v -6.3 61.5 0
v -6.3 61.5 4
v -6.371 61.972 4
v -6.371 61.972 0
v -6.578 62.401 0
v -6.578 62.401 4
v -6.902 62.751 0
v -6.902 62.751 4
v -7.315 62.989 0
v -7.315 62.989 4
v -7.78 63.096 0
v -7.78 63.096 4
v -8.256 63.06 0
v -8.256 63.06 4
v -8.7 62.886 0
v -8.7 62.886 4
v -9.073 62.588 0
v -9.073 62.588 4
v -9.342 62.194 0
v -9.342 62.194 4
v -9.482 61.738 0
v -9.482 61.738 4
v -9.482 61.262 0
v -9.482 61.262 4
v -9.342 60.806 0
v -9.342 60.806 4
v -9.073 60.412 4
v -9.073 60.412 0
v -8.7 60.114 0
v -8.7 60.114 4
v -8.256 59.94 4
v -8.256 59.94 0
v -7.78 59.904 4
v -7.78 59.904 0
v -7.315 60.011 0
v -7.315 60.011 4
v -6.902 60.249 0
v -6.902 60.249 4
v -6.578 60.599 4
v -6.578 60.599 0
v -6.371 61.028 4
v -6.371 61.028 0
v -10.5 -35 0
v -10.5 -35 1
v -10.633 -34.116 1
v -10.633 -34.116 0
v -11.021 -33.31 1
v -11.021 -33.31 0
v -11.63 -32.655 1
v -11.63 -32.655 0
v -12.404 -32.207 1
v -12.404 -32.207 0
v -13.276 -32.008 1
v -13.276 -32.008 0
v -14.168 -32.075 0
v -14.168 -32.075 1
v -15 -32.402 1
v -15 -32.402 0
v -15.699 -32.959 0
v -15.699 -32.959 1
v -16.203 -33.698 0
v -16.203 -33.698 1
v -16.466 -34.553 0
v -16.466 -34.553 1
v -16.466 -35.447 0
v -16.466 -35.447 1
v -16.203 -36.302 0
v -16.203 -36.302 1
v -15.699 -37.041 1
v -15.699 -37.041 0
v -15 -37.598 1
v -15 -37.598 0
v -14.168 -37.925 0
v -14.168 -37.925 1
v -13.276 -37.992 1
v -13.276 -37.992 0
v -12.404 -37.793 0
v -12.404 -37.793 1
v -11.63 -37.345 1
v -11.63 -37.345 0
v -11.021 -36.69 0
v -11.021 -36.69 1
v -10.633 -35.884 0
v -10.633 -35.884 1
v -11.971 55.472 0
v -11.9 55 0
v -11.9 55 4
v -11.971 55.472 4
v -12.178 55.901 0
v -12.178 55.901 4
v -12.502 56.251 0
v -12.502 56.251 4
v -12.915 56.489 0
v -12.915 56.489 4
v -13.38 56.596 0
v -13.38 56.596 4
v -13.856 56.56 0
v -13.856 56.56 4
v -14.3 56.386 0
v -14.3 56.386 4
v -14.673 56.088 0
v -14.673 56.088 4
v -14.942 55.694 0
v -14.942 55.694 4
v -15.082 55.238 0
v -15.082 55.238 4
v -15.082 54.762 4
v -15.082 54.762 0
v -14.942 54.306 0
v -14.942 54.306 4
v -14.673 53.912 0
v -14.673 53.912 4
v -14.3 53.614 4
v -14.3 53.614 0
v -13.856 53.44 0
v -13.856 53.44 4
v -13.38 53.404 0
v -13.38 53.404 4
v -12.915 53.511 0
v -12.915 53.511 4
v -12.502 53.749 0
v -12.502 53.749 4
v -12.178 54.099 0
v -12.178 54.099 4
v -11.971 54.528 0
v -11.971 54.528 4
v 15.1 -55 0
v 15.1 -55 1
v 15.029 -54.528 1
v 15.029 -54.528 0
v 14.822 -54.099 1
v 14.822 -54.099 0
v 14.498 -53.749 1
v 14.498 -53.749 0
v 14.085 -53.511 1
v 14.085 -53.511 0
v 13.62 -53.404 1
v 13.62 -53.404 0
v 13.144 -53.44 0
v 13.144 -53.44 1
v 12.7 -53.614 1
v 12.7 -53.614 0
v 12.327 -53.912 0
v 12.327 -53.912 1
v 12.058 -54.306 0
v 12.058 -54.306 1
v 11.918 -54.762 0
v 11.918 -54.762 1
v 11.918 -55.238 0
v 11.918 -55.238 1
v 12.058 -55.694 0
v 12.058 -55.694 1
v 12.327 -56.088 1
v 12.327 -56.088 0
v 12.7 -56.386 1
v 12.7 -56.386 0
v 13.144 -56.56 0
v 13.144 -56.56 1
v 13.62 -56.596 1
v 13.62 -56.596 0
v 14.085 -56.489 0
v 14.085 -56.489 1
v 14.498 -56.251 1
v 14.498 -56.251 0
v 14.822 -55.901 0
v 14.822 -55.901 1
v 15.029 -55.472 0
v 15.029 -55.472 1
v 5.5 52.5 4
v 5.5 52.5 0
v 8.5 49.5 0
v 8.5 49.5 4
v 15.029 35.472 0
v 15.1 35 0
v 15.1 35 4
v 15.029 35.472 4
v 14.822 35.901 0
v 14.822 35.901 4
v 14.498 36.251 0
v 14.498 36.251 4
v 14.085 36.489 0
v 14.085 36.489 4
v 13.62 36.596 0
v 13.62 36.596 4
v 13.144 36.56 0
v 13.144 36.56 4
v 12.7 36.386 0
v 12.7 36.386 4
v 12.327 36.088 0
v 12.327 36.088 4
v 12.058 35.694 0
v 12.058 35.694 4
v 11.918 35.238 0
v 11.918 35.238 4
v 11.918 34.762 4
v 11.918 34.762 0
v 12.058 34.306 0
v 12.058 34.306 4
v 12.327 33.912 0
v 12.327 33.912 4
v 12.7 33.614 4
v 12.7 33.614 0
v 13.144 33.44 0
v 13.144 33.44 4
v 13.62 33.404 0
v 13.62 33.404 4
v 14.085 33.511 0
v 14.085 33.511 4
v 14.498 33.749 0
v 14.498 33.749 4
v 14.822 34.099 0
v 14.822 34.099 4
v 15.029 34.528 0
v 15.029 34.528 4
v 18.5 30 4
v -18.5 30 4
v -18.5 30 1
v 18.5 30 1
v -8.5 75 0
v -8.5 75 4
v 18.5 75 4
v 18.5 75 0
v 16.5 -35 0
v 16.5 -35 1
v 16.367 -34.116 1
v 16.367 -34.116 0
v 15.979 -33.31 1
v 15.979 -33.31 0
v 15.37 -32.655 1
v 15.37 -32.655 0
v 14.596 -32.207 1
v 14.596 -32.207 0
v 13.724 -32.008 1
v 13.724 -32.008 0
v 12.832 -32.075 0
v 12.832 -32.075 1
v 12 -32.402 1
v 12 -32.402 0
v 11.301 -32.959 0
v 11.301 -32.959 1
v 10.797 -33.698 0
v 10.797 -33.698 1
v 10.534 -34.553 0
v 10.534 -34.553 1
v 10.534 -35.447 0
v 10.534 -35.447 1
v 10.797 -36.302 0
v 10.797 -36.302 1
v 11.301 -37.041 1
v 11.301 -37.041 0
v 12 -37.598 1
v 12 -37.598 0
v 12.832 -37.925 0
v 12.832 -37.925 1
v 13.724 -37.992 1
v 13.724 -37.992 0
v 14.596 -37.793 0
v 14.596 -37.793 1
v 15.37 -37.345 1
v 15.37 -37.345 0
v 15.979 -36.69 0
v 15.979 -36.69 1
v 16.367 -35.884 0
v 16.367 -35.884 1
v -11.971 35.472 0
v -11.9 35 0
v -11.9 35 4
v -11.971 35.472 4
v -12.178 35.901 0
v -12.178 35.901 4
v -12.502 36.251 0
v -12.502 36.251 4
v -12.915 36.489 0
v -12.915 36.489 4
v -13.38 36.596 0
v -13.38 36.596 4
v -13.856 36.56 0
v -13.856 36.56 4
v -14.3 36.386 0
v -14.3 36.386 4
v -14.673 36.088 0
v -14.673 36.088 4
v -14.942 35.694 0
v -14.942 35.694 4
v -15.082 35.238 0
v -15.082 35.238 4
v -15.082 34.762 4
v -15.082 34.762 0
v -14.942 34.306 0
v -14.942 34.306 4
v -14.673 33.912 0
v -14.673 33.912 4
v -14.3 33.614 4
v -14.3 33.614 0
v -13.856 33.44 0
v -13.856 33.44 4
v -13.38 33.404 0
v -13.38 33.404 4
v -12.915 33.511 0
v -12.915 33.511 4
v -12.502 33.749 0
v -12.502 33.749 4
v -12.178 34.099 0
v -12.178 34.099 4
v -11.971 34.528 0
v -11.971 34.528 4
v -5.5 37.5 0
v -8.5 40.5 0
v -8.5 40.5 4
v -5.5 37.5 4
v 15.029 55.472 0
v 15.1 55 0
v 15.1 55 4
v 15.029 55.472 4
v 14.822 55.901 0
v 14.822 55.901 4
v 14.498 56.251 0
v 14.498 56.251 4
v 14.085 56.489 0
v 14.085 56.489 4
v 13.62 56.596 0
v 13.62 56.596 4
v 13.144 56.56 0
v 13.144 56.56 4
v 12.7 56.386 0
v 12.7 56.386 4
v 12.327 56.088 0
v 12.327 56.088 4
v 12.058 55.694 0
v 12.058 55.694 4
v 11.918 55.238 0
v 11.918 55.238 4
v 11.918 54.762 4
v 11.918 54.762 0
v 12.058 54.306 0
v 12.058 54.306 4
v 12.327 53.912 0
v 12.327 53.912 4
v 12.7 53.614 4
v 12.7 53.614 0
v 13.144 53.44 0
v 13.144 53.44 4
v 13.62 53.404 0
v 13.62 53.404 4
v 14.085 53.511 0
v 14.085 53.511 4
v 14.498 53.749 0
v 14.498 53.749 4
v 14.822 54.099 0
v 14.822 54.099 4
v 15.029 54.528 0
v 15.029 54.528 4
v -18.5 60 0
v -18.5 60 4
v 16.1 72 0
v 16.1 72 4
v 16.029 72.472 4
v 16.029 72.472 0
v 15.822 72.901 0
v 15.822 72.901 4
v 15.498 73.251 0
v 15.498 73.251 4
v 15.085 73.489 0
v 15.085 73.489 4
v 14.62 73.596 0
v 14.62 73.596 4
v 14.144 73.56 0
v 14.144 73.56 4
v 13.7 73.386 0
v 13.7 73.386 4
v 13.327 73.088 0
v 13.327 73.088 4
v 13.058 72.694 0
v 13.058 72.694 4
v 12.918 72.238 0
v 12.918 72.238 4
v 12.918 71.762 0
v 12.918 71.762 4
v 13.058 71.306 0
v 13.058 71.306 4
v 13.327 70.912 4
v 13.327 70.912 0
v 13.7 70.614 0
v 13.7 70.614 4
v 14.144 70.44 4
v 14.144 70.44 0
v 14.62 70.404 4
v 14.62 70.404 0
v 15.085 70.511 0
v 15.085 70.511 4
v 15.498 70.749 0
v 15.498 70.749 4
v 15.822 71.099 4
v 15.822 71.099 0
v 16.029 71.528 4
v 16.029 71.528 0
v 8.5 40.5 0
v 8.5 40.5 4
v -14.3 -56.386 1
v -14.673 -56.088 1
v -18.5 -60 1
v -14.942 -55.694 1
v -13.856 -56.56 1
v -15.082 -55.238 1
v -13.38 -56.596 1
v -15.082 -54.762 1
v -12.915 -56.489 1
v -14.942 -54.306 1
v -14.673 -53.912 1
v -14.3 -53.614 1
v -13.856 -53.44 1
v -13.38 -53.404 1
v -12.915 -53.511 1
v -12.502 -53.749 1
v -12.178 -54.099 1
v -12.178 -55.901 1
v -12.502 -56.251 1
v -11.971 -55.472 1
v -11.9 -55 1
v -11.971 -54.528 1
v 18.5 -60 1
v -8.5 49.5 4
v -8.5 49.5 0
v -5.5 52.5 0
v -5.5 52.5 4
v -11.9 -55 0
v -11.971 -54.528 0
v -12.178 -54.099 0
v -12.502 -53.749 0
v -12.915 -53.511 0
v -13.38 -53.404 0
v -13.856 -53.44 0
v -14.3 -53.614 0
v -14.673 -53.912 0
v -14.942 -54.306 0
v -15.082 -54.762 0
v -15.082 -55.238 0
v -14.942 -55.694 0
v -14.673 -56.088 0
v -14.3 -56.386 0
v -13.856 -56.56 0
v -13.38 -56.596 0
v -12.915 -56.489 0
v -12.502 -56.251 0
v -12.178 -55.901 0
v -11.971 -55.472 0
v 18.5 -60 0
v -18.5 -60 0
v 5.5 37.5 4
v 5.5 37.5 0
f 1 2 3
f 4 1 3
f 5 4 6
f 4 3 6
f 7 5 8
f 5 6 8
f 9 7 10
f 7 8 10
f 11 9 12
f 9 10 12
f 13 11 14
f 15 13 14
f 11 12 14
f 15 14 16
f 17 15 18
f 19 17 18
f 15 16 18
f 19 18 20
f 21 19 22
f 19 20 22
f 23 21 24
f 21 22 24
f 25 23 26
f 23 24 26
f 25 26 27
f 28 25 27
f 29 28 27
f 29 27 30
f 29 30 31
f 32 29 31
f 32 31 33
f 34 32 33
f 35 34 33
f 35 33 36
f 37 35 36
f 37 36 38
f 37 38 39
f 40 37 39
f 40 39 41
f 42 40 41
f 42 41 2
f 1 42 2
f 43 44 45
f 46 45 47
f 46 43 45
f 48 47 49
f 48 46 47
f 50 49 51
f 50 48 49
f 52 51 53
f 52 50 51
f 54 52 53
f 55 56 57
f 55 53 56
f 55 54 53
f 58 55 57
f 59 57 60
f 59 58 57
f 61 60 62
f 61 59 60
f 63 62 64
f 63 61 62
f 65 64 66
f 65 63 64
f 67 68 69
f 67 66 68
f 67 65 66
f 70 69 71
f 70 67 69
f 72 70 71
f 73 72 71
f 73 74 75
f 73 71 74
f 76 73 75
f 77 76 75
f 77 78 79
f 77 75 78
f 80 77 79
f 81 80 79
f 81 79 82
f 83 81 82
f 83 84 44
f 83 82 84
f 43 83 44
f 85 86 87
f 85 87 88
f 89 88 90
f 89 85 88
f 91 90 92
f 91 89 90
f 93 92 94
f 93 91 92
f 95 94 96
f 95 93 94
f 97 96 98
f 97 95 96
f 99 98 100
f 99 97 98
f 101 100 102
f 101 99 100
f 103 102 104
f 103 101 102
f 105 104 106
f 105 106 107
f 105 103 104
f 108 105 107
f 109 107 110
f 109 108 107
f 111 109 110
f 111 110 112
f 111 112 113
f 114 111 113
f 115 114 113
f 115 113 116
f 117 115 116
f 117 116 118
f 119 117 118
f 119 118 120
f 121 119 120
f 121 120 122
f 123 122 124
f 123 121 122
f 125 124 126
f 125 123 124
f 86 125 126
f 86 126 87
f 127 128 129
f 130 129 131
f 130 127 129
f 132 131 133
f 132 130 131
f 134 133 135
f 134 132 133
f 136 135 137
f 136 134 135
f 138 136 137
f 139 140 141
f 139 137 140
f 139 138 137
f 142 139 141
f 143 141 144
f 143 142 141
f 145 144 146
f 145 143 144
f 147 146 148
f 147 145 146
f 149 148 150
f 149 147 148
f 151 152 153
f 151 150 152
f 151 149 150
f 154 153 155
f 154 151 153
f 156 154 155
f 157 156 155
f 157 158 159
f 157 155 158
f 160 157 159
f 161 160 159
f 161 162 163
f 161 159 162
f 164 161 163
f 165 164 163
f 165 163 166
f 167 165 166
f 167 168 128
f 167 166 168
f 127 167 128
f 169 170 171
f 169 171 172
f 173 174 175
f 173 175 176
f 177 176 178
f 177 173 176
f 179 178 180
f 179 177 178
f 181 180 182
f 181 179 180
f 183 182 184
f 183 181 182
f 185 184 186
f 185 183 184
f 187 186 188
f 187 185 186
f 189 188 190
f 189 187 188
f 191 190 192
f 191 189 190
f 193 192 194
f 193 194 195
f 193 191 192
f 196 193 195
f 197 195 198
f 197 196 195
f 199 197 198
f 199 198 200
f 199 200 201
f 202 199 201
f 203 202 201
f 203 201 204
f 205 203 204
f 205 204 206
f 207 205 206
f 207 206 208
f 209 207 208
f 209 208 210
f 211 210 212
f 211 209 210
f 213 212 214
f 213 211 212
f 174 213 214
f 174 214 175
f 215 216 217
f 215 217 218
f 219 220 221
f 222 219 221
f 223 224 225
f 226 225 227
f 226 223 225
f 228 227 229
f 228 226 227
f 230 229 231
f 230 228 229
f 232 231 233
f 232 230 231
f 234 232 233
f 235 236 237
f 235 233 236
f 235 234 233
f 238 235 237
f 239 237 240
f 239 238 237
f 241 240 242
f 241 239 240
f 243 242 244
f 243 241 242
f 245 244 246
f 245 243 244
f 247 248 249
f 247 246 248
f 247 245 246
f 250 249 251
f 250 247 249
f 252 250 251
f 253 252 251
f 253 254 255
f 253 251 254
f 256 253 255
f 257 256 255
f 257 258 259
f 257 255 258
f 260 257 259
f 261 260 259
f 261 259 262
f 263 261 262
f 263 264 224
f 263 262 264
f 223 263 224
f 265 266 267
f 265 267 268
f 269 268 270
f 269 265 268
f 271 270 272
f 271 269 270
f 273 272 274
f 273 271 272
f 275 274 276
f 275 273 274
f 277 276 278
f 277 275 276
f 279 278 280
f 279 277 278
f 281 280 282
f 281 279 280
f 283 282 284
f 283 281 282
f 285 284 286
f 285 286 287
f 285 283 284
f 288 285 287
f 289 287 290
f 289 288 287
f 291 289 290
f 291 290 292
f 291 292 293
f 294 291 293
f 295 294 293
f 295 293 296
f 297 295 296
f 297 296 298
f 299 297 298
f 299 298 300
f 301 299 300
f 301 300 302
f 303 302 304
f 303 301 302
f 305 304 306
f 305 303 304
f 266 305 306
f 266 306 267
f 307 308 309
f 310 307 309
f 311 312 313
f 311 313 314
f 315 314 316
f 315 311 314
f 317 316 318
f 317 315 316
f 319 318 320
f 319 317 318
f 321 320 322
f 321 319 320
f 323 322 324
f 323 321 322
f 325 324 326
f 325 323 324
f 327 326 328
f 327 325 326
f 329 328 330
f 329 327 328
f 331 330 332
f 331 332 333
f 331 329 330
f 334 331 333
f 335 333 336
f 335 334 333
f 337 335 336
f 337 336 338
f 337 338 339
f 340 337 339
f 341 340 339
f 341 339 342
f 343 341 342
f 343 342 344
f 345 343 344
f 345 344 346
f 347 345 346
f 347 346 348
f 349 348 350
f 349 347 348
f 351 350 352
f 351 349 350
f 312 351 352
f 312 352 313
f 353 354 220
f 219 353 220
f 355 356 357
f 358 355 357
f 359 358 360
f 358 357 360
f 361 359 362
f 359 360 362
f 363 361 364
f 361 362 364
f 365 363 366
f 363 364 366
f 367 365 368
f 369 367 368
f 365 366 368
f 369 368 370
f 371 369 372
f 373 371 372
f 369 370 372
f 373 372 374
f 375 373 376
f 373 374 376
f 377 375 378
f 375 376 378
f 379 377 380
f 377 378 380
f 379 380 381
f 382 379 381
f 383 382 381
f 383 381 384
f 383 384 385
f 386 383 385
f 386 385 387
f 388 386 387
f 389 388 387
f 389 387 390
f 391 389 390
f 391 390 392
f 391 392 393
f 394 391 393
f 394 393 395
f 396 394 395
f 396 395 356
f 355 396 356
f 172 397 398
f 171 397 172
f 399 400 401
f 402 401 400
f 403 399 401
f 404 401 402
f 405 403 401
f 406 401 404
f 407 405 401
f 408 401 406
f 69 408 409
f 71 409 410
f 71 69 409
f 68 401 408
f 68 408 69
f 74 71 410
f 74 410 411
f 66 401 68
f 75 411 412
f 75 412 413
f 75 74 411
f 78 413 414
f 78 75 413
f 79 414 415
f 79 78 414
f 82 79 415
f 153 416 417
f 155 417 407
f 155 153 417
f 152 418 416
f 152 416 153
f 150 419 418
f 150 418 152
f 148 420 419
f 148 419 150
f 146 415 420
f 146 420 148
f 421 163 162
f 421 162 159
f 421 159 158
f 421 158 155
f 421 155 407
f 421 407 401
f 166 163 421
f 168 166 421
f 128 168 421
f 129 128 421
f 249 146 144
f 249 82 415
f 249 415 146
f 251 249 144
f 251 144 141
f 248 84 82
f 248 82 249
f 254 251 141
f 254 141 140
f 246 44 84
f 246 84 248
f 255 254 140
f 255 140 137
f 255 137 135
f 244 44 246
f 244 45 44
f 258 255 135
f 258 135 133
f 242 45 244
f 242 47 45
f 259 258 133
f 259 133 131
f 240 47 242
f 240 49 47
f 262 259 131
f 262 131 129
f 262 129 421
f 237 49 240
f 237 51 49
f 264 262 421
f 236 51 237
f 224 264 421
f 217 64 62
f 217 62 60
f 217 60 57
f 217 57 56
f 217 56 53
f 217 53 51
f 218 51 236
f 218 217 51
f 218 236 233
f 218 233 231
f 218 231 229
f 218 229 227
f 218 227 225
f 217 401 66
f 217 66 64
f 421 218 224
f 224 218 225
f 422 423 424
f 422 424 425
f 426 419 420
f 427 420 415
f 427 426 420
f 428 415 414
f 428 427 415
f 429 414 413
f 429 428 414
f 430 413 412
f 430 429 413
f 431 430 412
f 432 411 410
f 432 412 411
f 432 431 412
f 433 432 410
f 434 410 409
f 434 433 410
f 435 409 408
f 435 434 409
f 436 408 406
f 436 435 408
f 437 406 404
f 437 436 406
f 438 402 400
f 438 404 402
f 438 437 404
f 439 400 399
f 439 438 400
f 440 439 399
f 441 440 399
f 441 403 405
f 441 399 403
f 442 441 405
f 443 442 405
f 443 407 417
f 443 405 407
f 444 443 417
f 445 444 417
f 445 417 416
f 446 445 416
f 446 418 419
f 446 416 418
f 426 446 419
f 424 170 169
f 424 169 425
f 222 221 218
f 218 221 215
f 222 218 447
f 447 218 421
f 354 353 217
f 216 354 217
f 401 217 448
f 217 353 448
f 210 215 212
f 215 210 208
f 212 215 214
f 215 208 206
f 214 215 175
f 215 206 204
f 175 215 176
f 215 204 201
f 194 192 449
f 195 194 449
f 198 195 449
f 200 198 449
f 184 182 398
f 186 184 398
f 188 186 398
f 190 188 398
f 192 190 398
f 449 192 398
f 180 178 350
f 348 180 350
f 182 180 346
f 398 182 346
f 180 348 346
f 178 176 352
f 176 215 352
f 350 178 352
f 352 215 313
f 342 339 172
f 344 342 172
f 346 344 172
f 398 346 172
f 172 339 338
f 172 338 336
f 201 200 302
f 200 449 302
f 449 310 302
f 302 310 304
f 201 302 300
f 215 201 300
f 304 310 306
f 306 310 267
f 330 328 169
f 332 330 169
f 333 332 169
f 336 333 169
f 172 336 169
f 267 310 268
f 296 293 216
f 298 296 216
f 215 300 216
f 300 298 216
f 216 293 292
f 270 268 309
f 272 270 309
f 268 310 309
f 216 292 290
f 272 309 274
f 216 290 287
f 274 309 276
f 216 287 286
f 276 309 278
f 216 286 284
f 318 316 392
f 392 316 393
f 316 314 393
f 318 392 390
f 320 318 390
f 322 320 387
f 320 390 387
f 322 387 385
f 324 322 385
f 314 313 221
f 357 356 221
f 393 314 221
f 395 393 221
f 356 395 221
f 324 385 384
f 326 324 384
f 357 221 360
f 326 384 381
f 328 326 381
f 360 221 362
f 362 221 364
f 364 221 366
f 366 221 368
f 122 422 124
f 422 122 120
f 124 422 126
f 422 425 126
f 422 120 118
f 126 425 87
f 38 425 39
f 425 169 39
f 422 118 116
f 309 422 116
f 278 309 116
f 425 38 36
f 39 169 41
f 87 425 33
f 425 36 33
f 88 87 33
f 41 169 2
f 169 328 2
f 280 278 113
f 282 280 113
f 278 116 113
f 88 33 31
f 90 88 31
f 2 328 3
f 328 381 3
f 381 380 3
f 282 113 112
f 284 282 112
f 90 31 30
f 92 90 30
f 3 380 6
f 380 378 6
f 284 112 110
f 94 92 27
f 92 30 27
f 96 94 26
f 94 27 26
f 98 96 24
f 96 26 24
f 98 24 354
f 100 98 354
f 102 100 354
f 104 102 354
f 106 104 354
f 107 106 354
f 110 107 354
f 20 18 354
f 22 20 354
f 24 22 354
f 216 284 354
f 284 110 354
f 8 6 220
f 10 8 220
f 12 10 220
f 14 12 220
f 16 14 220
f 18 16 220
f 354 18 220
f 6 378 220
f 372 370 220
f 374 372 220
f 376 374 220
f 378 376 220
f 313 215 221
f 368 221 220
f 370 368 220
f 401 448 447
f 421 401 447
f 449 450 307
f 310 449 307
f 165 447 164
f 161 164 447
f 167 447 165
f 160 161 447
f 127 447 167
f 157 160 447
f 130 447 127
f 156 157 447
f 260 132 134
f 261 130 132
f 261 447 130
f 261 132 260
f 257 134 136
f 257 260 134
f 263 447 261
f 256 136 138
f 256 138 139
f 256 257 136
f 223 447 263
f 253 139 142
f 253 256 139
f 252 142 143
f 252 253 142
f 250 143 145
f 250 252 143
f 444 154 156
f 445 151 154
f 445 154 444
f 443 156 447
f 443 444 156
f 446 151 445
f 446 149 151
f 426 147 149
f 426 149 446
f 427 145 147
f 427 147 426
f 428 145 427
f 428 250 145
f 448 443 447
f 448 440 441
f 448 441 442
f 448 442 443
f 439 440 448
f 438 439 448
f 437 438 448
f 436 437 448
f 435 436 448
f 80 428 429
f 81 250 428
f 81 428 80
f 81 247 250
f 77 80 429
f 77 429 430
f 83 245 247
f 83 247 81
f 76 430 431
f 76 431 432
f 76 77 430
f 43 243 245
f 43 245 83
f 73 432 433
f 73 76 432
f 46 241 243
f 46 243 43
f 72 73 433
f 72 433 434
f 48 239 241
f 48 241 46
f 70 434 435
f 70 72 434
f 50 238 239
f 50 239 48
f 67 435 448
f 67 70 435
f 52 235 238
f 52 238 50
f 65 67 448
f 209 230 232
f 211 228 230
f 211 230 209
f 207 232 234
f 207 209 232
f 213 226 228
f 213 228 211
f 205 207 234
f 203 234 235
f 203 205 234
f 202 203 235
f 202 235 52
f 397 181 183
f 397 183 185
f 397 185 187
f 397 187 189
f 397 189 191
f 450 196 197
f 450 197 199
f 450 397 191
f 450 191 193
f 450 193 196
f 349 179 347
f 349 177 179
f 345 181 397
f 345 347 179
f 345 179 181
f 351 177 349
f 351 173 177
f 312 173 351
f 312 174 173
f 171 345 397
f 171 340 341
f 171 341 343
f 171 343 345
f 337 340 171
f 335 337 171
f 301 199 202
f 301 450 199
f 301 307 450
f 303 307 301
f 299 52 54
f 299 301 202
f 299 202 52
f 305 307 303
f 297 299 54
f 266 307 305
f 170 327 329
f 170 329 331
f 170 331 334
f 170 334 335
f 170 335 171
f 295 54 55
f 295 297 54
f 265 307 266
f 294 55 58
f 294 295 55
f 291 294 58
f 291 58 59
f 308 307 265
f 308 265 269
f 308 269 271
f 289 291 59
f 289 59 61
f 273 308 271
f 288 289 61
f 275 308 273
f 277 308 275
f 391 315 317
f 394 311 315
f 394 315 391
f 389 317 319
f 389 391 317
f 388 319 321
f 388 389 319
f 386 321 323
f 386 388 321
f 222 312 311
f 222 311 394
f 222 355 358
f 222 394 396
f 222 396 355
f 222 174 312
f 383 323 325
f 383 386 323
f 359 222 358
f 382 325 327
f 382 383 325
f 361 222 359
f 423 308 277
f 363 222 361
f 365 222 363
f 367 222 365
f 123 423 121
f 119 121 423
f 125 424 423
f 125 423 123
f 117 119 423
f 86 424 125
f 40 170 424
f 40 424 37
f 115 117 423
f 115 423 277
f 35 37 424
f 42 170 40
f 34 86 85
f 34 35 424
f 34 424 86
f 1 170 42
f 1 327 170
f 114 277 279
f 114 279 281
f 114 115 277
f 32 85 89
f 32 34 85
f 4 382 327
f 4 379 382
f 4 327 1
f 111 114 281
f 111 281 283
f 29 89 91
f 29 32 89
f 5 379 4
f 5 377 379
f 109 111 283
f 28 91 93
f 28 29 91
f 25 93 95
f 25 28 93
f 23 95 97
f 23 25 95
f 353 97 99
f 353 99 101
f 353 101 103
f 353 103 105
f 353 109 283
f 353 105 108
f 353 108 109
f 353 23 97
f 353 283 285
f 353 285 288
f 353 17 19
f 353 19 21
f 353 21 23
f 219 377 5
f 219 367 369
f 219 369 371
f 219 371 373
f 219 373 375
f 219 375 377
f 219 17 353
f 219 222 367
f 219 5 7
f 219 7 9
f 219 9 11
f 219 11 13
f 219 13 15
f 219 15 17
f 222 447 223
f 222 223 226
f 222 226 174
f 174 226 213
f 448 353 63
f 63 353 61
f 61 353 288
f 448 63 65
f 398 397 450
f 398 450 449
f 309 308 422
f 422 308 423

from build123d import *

# Parameters (mm, degrees)
SKETCH_1_W          = 37
SKETCH_1_H          = 120
SKETCH_1_R          = 1.6
SKETCH_1_R_2        = 3
EXTRUDE_1_DEPTH     = 4
SKETCH_2_W          = 37
SKETCH_2_H          = 90
CUT_EXTRUDE_1_DEPTH = 3
SKETCH_3_W          = 17
SKETCH_3_H          = 15
CUT_EXTRUDE_2_DEPTH = 63.914624691
CHAMFER_1_SIZE      = 3
EXTRUDE_2_DEPTH     = 4
SKETCH_5_R          = 1.6
CUT_EXTRUDE_3_DEPTH = 78.351470574


with BuildPart() as part:
    # ｽｹｯﾁ1 → ﾎﾞｽ - 押し出し1 (new body)
    # profile 1 of 2: a face of its own
    with BuildSketch(Plane.XY):
        Rectangle(SKETCH_1_W, SKETCH_1_H)
        with Locations((13.5, -55)):
            Circle(SKETCH_1_R, mode=Mode.SUBTRACT)
        with Locations((13.5, -35)):
            Circle(SKETCH_1_R_2, mode=Mode.SUBTRACT)
        with Locations((-13.5, -55)):
            Circle(SKETCH_1_R, mode=Mode.SUBTRACT)
        with Locations((-13.5, -35)):
            Circle(SKETCH_1_R_2, mode=Mode.SUBTRACT)
        with Locations((13.5, 35)):
            Circle(SKETCH_1_R, mode=Mode.SUBTRACT)
        with Locations((13.5, 55)):
            Circle(SKETCH_1_R, mode=Mode.SUBTRACT)
        with Locations((-13.5, 35)):
            Circle(SKETCH_1_R, mode=Mode.SUBTRACT)
        with Locations((-13.5, 55)):
            Circle(SKETCH_1_R, mode=Mode.SUBTRACT)
    # profile 2 of 2: a face of its own
    with BuildSketch(Plane.XY):
        Polygon((-18.5, -25), (-18.5, -60), (18.5, -60), (18.5, 60), (-18.5, 60), (-18.5, 25), align=None)
        with Locations((-13.5, -55)):
            Circle(SKETCH_1_R, mode=Mode.SUBTRACT)
        with Locations((-13.5, -35)):
            Circle(SKETCH_1_R_2, mode=Mode.SUBTRACT)
        with Locations((13.5, -55)):
            Circle(SKETCH_1_R, mode=Mode.SUBTRACT)
        with Locations((13.5, -35)):
            Circle(SKETCH_1_R_2, mode=Mode.SUBTRACT)
        with Locations((-13.5, 35)):
            Circle(SKETCH_1_R, mode=Mode.SUBTRACT)
        with Locations((-13.5, 55)):
            Circle(SKETCH_1_R, mode=Mode.SUBTRACT)
        with Locations((13.5, 35)):
            Circle(SKETCH_1_R, mode=Mode.SUBTRACT)
        with Locations((13.5, 55)):
            Circle(SKETCH_1_R, mode=Mode.SUBTRACT)
    extrude(amount=EXTRUDE_1_DEPTH)

    # ｽｹｯﾁ2 → ｶｯﾄ - 押し出し1 (cut)
    with BuildSketch(Plane.XY.offset(4)):
        with Locations((0, -15)):
            Rectangle(SKETCH_2_W, SKETCH_2_H)
    extrude(amount=-CUT_EXTRUDE_1_DEPTH, mode=Mode.SUBTRACT)

    # ｽｹｯﾁ3 → ｶｯﾄ - 押し出し2 (cut, through all)
    with BuildSketch(Plane(origin=(0, 0, 0), x_dir=(-1, 0, 0), z_dir=(0, 0, -1))):
        with Locations((0, 45)):
            Rectangle(SKETCH_3_W, SKETCH_3_H)
    extrude(amount=-CUT_EXTRUDE_2_DEPTH, mode=Mode.SUBTRACT)

    # 面取り1
    chamfer_1_edges = [part.edges().sort_by_distance(p)[0] for p in [
        (8.5, 37.5, 2),
        (8.5, 52.5, 2),
        (-8.5, 52.5, 2),
        (-8.5, 37.5, 2),
    ]]
    chamfer(chamfer_1_edges, length=CHAMFER_1_SIZE)

    # ｽｹｯﾁ4 → ﾎﾞｽ - 押し出し2 (add, through all)
    with BuildSketch(Plane.XY.offset(4)):
        Polygon((18.5, 75), (18.5, 60), (-18.5, 60), (-8.5, 75), align=None)
    extrude(amount=-EXTRUDE_2_DEPTH)

    # ｽｹｯﾁ5 → ｶｯﾄ - 押し出し3 (cut, through all)
    with BuildSketch(Plane.XY.offset(4)):
        with Locations((14.5, 72)):
            Circle(SKETCH_5_R)
        with Locations((-7.9, 61.5)):
            Circle(SKETCH_5_R)
    extrude(amount=-CUT_EXTRUDE_3_DEPTH, mode=Mode.SUBTRACT)


solid = part.part
